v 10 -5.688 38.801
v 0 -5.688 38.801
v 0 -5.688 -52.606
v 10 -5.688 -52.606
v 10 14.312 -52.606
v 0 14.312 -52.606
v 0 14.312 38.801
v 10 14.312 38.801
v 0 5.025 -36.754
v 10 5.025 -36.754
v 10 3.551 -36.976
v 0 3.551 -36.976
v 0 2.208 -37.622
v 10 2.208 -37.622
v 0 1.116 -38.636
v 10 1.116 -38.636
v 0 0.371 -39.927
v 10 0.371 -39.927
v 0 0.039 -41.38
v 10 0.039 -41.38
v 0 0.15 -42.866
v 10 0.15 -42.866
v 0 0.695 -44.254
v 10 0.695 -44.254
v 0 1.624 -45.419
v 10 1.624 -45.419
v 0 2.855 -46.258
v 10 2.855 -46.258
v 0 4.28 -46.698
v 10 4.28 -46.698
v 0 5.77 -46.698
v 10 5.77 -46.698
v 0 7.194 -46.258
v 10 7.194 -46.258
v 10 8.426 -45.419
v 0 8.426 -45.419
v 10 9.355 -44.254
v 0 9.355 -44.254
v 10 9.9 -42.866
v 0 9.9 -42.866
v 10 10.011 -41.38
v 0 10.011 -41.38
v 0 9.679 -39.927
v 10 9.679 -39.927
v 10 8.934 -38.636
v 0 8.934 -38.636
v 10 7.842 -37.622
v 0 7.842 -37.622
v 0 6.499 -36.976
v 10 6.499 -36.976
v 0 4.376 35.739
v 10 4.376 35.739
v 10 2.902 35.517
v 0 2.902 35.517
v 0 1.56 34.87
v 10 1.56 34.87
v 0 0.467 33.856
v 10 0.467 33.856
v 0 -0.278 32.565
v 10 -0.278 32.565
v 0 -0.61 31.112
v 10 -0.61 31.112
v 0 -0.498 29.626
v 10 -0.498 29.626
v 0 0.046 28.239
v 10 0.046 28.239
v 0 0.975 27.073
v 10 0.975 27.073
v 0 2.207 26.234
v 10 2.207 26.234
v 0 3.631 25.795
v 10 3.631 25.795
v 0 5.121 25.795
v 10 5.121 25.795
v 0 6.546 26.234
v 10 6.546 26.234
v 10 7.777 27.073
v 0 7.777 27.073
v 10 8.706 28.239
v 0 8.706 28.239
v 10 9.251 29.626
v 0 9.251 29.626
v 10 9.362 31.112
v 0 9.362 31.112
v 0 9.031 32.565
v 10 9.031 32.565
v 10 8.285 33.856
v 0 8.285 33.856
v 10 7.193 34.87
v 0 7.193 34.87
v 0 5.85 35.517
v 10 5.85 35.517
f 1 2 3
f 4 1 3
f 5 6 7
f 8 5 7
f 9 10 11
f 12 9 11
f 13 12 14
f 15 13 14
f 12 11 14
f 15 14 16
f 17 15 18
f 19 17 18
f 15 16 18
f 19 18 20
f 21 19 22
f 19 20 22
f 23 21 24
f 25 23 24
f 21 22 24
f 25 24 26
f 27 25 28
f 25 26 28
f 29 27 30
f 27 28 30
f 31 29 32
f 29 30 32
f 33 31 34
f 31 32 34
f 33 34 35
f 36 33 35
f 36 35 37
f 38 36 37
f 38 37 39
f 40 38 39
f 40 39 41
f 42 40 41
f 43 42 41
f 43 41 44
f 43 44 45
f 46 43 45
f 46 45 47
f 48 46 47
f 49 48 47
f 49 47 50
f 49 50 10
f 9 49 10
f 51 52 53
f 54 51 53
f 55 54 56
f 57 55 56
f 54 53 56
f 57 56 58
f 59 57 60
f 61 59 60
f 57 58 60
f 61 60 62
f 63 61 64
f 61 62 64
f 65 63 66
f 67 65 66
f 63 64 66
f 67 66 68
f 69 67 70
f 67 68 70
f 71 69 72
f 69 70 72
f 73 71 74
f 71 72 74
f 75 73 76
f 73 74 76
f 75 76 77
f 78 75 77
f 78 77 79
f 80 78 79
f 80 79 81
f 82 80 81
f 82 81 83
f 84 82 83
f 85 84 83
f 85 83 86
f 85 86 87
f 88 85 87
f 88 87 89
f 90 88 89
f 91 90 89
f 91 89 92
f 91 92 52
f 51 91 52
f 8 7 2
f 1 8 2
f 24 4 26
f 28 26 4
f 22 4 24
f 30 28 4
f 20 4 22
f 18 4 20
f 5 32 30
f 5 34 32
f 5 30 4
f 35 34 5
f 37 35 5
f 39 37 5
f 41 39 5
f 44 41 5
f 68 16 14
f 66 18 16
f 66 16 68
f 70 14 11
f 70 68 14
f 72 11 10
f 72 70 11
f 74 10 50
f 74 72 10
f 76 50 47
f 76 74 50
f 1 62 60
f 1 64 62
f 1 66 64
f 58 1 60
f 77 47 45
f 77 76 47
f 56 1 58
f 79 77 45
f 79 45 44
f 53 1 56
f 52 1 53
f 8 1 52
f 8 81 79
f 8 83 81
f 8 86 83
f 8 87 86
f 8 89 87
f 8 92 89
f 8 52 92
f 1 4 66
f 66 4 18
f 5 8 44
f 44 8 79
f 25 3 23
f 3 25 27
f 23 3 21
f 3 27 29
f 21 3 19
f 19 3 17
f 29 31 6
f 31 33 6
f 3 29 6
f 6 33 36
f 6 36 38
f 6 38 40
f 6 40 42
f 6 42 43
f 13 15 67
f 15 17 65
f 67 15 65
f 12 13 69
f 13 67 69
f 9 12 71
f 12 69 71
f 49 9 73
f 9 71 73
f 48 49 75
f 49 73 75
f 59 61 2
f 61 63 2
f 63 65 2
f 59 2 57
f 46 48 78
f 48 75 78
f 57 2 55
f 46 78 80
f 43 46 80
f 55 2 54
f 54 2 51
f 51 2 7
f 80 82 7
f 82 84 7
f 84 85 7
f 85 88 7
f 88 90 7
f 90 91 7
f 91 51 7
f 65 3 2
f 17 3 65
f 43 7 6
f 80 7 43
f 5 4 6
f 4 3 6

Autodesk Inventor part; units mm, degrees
ref_plane "YZ Plane" through (0, 0, 0) normal (1, 0, 0) x (0, 1, 0)
ref_plane "XZ Plane" through (0, 0, 0) normal (0, 1, 0) x (-1, 0, 0)
ref_plane "XY Plane" through (0, 0, 0) normal (0, 0, 1) x (1, 0, 0)
sketch "Sketch1" plane through (0, 0, 0) normal (1, 0, 0) x (0, 1, 0)
  line L0 (14.3117, 38.8012) -> (-5.6883, 38.8012)
  line L1 (-5.6883, 38.8012) -> (-5.6883, -52.6055)
  line L2 (-5.6883, -52.6055) -> (14.3117, -52.6055)
  line L3 (14.3117, -52.6055) -> (14.3117, 38.8012)
  point P0 (0, 0)
  dimension "d1" = 20
extrude "Extrusion1" add sketch "Sketch1" along normal blind 10
sketch "Sketch2" plane through (0, 0, 0) normal (-1, 0, 0) x (0, 0, 1)
  point P0 (0, 0)
  point P1 (30.7387, 4.3762)
hole "Hole1" at (0, 4.3762, 30.7387) direction (1, 0, 0) diameter 10 end through all
sketch "Sketch3" plane through (0, 0, 0) normal (-1, 0, 0) x (0, 0, 1)
  point P0 (0, 0)
  point P1 (-41.7535, 5.0249)
hole "Hole2" at (0, 5.0249, -41.7535) direction (1, 0, 0) diameter 10 end through all
properties part number "expo arm" material "PVC, Unplasticized"
